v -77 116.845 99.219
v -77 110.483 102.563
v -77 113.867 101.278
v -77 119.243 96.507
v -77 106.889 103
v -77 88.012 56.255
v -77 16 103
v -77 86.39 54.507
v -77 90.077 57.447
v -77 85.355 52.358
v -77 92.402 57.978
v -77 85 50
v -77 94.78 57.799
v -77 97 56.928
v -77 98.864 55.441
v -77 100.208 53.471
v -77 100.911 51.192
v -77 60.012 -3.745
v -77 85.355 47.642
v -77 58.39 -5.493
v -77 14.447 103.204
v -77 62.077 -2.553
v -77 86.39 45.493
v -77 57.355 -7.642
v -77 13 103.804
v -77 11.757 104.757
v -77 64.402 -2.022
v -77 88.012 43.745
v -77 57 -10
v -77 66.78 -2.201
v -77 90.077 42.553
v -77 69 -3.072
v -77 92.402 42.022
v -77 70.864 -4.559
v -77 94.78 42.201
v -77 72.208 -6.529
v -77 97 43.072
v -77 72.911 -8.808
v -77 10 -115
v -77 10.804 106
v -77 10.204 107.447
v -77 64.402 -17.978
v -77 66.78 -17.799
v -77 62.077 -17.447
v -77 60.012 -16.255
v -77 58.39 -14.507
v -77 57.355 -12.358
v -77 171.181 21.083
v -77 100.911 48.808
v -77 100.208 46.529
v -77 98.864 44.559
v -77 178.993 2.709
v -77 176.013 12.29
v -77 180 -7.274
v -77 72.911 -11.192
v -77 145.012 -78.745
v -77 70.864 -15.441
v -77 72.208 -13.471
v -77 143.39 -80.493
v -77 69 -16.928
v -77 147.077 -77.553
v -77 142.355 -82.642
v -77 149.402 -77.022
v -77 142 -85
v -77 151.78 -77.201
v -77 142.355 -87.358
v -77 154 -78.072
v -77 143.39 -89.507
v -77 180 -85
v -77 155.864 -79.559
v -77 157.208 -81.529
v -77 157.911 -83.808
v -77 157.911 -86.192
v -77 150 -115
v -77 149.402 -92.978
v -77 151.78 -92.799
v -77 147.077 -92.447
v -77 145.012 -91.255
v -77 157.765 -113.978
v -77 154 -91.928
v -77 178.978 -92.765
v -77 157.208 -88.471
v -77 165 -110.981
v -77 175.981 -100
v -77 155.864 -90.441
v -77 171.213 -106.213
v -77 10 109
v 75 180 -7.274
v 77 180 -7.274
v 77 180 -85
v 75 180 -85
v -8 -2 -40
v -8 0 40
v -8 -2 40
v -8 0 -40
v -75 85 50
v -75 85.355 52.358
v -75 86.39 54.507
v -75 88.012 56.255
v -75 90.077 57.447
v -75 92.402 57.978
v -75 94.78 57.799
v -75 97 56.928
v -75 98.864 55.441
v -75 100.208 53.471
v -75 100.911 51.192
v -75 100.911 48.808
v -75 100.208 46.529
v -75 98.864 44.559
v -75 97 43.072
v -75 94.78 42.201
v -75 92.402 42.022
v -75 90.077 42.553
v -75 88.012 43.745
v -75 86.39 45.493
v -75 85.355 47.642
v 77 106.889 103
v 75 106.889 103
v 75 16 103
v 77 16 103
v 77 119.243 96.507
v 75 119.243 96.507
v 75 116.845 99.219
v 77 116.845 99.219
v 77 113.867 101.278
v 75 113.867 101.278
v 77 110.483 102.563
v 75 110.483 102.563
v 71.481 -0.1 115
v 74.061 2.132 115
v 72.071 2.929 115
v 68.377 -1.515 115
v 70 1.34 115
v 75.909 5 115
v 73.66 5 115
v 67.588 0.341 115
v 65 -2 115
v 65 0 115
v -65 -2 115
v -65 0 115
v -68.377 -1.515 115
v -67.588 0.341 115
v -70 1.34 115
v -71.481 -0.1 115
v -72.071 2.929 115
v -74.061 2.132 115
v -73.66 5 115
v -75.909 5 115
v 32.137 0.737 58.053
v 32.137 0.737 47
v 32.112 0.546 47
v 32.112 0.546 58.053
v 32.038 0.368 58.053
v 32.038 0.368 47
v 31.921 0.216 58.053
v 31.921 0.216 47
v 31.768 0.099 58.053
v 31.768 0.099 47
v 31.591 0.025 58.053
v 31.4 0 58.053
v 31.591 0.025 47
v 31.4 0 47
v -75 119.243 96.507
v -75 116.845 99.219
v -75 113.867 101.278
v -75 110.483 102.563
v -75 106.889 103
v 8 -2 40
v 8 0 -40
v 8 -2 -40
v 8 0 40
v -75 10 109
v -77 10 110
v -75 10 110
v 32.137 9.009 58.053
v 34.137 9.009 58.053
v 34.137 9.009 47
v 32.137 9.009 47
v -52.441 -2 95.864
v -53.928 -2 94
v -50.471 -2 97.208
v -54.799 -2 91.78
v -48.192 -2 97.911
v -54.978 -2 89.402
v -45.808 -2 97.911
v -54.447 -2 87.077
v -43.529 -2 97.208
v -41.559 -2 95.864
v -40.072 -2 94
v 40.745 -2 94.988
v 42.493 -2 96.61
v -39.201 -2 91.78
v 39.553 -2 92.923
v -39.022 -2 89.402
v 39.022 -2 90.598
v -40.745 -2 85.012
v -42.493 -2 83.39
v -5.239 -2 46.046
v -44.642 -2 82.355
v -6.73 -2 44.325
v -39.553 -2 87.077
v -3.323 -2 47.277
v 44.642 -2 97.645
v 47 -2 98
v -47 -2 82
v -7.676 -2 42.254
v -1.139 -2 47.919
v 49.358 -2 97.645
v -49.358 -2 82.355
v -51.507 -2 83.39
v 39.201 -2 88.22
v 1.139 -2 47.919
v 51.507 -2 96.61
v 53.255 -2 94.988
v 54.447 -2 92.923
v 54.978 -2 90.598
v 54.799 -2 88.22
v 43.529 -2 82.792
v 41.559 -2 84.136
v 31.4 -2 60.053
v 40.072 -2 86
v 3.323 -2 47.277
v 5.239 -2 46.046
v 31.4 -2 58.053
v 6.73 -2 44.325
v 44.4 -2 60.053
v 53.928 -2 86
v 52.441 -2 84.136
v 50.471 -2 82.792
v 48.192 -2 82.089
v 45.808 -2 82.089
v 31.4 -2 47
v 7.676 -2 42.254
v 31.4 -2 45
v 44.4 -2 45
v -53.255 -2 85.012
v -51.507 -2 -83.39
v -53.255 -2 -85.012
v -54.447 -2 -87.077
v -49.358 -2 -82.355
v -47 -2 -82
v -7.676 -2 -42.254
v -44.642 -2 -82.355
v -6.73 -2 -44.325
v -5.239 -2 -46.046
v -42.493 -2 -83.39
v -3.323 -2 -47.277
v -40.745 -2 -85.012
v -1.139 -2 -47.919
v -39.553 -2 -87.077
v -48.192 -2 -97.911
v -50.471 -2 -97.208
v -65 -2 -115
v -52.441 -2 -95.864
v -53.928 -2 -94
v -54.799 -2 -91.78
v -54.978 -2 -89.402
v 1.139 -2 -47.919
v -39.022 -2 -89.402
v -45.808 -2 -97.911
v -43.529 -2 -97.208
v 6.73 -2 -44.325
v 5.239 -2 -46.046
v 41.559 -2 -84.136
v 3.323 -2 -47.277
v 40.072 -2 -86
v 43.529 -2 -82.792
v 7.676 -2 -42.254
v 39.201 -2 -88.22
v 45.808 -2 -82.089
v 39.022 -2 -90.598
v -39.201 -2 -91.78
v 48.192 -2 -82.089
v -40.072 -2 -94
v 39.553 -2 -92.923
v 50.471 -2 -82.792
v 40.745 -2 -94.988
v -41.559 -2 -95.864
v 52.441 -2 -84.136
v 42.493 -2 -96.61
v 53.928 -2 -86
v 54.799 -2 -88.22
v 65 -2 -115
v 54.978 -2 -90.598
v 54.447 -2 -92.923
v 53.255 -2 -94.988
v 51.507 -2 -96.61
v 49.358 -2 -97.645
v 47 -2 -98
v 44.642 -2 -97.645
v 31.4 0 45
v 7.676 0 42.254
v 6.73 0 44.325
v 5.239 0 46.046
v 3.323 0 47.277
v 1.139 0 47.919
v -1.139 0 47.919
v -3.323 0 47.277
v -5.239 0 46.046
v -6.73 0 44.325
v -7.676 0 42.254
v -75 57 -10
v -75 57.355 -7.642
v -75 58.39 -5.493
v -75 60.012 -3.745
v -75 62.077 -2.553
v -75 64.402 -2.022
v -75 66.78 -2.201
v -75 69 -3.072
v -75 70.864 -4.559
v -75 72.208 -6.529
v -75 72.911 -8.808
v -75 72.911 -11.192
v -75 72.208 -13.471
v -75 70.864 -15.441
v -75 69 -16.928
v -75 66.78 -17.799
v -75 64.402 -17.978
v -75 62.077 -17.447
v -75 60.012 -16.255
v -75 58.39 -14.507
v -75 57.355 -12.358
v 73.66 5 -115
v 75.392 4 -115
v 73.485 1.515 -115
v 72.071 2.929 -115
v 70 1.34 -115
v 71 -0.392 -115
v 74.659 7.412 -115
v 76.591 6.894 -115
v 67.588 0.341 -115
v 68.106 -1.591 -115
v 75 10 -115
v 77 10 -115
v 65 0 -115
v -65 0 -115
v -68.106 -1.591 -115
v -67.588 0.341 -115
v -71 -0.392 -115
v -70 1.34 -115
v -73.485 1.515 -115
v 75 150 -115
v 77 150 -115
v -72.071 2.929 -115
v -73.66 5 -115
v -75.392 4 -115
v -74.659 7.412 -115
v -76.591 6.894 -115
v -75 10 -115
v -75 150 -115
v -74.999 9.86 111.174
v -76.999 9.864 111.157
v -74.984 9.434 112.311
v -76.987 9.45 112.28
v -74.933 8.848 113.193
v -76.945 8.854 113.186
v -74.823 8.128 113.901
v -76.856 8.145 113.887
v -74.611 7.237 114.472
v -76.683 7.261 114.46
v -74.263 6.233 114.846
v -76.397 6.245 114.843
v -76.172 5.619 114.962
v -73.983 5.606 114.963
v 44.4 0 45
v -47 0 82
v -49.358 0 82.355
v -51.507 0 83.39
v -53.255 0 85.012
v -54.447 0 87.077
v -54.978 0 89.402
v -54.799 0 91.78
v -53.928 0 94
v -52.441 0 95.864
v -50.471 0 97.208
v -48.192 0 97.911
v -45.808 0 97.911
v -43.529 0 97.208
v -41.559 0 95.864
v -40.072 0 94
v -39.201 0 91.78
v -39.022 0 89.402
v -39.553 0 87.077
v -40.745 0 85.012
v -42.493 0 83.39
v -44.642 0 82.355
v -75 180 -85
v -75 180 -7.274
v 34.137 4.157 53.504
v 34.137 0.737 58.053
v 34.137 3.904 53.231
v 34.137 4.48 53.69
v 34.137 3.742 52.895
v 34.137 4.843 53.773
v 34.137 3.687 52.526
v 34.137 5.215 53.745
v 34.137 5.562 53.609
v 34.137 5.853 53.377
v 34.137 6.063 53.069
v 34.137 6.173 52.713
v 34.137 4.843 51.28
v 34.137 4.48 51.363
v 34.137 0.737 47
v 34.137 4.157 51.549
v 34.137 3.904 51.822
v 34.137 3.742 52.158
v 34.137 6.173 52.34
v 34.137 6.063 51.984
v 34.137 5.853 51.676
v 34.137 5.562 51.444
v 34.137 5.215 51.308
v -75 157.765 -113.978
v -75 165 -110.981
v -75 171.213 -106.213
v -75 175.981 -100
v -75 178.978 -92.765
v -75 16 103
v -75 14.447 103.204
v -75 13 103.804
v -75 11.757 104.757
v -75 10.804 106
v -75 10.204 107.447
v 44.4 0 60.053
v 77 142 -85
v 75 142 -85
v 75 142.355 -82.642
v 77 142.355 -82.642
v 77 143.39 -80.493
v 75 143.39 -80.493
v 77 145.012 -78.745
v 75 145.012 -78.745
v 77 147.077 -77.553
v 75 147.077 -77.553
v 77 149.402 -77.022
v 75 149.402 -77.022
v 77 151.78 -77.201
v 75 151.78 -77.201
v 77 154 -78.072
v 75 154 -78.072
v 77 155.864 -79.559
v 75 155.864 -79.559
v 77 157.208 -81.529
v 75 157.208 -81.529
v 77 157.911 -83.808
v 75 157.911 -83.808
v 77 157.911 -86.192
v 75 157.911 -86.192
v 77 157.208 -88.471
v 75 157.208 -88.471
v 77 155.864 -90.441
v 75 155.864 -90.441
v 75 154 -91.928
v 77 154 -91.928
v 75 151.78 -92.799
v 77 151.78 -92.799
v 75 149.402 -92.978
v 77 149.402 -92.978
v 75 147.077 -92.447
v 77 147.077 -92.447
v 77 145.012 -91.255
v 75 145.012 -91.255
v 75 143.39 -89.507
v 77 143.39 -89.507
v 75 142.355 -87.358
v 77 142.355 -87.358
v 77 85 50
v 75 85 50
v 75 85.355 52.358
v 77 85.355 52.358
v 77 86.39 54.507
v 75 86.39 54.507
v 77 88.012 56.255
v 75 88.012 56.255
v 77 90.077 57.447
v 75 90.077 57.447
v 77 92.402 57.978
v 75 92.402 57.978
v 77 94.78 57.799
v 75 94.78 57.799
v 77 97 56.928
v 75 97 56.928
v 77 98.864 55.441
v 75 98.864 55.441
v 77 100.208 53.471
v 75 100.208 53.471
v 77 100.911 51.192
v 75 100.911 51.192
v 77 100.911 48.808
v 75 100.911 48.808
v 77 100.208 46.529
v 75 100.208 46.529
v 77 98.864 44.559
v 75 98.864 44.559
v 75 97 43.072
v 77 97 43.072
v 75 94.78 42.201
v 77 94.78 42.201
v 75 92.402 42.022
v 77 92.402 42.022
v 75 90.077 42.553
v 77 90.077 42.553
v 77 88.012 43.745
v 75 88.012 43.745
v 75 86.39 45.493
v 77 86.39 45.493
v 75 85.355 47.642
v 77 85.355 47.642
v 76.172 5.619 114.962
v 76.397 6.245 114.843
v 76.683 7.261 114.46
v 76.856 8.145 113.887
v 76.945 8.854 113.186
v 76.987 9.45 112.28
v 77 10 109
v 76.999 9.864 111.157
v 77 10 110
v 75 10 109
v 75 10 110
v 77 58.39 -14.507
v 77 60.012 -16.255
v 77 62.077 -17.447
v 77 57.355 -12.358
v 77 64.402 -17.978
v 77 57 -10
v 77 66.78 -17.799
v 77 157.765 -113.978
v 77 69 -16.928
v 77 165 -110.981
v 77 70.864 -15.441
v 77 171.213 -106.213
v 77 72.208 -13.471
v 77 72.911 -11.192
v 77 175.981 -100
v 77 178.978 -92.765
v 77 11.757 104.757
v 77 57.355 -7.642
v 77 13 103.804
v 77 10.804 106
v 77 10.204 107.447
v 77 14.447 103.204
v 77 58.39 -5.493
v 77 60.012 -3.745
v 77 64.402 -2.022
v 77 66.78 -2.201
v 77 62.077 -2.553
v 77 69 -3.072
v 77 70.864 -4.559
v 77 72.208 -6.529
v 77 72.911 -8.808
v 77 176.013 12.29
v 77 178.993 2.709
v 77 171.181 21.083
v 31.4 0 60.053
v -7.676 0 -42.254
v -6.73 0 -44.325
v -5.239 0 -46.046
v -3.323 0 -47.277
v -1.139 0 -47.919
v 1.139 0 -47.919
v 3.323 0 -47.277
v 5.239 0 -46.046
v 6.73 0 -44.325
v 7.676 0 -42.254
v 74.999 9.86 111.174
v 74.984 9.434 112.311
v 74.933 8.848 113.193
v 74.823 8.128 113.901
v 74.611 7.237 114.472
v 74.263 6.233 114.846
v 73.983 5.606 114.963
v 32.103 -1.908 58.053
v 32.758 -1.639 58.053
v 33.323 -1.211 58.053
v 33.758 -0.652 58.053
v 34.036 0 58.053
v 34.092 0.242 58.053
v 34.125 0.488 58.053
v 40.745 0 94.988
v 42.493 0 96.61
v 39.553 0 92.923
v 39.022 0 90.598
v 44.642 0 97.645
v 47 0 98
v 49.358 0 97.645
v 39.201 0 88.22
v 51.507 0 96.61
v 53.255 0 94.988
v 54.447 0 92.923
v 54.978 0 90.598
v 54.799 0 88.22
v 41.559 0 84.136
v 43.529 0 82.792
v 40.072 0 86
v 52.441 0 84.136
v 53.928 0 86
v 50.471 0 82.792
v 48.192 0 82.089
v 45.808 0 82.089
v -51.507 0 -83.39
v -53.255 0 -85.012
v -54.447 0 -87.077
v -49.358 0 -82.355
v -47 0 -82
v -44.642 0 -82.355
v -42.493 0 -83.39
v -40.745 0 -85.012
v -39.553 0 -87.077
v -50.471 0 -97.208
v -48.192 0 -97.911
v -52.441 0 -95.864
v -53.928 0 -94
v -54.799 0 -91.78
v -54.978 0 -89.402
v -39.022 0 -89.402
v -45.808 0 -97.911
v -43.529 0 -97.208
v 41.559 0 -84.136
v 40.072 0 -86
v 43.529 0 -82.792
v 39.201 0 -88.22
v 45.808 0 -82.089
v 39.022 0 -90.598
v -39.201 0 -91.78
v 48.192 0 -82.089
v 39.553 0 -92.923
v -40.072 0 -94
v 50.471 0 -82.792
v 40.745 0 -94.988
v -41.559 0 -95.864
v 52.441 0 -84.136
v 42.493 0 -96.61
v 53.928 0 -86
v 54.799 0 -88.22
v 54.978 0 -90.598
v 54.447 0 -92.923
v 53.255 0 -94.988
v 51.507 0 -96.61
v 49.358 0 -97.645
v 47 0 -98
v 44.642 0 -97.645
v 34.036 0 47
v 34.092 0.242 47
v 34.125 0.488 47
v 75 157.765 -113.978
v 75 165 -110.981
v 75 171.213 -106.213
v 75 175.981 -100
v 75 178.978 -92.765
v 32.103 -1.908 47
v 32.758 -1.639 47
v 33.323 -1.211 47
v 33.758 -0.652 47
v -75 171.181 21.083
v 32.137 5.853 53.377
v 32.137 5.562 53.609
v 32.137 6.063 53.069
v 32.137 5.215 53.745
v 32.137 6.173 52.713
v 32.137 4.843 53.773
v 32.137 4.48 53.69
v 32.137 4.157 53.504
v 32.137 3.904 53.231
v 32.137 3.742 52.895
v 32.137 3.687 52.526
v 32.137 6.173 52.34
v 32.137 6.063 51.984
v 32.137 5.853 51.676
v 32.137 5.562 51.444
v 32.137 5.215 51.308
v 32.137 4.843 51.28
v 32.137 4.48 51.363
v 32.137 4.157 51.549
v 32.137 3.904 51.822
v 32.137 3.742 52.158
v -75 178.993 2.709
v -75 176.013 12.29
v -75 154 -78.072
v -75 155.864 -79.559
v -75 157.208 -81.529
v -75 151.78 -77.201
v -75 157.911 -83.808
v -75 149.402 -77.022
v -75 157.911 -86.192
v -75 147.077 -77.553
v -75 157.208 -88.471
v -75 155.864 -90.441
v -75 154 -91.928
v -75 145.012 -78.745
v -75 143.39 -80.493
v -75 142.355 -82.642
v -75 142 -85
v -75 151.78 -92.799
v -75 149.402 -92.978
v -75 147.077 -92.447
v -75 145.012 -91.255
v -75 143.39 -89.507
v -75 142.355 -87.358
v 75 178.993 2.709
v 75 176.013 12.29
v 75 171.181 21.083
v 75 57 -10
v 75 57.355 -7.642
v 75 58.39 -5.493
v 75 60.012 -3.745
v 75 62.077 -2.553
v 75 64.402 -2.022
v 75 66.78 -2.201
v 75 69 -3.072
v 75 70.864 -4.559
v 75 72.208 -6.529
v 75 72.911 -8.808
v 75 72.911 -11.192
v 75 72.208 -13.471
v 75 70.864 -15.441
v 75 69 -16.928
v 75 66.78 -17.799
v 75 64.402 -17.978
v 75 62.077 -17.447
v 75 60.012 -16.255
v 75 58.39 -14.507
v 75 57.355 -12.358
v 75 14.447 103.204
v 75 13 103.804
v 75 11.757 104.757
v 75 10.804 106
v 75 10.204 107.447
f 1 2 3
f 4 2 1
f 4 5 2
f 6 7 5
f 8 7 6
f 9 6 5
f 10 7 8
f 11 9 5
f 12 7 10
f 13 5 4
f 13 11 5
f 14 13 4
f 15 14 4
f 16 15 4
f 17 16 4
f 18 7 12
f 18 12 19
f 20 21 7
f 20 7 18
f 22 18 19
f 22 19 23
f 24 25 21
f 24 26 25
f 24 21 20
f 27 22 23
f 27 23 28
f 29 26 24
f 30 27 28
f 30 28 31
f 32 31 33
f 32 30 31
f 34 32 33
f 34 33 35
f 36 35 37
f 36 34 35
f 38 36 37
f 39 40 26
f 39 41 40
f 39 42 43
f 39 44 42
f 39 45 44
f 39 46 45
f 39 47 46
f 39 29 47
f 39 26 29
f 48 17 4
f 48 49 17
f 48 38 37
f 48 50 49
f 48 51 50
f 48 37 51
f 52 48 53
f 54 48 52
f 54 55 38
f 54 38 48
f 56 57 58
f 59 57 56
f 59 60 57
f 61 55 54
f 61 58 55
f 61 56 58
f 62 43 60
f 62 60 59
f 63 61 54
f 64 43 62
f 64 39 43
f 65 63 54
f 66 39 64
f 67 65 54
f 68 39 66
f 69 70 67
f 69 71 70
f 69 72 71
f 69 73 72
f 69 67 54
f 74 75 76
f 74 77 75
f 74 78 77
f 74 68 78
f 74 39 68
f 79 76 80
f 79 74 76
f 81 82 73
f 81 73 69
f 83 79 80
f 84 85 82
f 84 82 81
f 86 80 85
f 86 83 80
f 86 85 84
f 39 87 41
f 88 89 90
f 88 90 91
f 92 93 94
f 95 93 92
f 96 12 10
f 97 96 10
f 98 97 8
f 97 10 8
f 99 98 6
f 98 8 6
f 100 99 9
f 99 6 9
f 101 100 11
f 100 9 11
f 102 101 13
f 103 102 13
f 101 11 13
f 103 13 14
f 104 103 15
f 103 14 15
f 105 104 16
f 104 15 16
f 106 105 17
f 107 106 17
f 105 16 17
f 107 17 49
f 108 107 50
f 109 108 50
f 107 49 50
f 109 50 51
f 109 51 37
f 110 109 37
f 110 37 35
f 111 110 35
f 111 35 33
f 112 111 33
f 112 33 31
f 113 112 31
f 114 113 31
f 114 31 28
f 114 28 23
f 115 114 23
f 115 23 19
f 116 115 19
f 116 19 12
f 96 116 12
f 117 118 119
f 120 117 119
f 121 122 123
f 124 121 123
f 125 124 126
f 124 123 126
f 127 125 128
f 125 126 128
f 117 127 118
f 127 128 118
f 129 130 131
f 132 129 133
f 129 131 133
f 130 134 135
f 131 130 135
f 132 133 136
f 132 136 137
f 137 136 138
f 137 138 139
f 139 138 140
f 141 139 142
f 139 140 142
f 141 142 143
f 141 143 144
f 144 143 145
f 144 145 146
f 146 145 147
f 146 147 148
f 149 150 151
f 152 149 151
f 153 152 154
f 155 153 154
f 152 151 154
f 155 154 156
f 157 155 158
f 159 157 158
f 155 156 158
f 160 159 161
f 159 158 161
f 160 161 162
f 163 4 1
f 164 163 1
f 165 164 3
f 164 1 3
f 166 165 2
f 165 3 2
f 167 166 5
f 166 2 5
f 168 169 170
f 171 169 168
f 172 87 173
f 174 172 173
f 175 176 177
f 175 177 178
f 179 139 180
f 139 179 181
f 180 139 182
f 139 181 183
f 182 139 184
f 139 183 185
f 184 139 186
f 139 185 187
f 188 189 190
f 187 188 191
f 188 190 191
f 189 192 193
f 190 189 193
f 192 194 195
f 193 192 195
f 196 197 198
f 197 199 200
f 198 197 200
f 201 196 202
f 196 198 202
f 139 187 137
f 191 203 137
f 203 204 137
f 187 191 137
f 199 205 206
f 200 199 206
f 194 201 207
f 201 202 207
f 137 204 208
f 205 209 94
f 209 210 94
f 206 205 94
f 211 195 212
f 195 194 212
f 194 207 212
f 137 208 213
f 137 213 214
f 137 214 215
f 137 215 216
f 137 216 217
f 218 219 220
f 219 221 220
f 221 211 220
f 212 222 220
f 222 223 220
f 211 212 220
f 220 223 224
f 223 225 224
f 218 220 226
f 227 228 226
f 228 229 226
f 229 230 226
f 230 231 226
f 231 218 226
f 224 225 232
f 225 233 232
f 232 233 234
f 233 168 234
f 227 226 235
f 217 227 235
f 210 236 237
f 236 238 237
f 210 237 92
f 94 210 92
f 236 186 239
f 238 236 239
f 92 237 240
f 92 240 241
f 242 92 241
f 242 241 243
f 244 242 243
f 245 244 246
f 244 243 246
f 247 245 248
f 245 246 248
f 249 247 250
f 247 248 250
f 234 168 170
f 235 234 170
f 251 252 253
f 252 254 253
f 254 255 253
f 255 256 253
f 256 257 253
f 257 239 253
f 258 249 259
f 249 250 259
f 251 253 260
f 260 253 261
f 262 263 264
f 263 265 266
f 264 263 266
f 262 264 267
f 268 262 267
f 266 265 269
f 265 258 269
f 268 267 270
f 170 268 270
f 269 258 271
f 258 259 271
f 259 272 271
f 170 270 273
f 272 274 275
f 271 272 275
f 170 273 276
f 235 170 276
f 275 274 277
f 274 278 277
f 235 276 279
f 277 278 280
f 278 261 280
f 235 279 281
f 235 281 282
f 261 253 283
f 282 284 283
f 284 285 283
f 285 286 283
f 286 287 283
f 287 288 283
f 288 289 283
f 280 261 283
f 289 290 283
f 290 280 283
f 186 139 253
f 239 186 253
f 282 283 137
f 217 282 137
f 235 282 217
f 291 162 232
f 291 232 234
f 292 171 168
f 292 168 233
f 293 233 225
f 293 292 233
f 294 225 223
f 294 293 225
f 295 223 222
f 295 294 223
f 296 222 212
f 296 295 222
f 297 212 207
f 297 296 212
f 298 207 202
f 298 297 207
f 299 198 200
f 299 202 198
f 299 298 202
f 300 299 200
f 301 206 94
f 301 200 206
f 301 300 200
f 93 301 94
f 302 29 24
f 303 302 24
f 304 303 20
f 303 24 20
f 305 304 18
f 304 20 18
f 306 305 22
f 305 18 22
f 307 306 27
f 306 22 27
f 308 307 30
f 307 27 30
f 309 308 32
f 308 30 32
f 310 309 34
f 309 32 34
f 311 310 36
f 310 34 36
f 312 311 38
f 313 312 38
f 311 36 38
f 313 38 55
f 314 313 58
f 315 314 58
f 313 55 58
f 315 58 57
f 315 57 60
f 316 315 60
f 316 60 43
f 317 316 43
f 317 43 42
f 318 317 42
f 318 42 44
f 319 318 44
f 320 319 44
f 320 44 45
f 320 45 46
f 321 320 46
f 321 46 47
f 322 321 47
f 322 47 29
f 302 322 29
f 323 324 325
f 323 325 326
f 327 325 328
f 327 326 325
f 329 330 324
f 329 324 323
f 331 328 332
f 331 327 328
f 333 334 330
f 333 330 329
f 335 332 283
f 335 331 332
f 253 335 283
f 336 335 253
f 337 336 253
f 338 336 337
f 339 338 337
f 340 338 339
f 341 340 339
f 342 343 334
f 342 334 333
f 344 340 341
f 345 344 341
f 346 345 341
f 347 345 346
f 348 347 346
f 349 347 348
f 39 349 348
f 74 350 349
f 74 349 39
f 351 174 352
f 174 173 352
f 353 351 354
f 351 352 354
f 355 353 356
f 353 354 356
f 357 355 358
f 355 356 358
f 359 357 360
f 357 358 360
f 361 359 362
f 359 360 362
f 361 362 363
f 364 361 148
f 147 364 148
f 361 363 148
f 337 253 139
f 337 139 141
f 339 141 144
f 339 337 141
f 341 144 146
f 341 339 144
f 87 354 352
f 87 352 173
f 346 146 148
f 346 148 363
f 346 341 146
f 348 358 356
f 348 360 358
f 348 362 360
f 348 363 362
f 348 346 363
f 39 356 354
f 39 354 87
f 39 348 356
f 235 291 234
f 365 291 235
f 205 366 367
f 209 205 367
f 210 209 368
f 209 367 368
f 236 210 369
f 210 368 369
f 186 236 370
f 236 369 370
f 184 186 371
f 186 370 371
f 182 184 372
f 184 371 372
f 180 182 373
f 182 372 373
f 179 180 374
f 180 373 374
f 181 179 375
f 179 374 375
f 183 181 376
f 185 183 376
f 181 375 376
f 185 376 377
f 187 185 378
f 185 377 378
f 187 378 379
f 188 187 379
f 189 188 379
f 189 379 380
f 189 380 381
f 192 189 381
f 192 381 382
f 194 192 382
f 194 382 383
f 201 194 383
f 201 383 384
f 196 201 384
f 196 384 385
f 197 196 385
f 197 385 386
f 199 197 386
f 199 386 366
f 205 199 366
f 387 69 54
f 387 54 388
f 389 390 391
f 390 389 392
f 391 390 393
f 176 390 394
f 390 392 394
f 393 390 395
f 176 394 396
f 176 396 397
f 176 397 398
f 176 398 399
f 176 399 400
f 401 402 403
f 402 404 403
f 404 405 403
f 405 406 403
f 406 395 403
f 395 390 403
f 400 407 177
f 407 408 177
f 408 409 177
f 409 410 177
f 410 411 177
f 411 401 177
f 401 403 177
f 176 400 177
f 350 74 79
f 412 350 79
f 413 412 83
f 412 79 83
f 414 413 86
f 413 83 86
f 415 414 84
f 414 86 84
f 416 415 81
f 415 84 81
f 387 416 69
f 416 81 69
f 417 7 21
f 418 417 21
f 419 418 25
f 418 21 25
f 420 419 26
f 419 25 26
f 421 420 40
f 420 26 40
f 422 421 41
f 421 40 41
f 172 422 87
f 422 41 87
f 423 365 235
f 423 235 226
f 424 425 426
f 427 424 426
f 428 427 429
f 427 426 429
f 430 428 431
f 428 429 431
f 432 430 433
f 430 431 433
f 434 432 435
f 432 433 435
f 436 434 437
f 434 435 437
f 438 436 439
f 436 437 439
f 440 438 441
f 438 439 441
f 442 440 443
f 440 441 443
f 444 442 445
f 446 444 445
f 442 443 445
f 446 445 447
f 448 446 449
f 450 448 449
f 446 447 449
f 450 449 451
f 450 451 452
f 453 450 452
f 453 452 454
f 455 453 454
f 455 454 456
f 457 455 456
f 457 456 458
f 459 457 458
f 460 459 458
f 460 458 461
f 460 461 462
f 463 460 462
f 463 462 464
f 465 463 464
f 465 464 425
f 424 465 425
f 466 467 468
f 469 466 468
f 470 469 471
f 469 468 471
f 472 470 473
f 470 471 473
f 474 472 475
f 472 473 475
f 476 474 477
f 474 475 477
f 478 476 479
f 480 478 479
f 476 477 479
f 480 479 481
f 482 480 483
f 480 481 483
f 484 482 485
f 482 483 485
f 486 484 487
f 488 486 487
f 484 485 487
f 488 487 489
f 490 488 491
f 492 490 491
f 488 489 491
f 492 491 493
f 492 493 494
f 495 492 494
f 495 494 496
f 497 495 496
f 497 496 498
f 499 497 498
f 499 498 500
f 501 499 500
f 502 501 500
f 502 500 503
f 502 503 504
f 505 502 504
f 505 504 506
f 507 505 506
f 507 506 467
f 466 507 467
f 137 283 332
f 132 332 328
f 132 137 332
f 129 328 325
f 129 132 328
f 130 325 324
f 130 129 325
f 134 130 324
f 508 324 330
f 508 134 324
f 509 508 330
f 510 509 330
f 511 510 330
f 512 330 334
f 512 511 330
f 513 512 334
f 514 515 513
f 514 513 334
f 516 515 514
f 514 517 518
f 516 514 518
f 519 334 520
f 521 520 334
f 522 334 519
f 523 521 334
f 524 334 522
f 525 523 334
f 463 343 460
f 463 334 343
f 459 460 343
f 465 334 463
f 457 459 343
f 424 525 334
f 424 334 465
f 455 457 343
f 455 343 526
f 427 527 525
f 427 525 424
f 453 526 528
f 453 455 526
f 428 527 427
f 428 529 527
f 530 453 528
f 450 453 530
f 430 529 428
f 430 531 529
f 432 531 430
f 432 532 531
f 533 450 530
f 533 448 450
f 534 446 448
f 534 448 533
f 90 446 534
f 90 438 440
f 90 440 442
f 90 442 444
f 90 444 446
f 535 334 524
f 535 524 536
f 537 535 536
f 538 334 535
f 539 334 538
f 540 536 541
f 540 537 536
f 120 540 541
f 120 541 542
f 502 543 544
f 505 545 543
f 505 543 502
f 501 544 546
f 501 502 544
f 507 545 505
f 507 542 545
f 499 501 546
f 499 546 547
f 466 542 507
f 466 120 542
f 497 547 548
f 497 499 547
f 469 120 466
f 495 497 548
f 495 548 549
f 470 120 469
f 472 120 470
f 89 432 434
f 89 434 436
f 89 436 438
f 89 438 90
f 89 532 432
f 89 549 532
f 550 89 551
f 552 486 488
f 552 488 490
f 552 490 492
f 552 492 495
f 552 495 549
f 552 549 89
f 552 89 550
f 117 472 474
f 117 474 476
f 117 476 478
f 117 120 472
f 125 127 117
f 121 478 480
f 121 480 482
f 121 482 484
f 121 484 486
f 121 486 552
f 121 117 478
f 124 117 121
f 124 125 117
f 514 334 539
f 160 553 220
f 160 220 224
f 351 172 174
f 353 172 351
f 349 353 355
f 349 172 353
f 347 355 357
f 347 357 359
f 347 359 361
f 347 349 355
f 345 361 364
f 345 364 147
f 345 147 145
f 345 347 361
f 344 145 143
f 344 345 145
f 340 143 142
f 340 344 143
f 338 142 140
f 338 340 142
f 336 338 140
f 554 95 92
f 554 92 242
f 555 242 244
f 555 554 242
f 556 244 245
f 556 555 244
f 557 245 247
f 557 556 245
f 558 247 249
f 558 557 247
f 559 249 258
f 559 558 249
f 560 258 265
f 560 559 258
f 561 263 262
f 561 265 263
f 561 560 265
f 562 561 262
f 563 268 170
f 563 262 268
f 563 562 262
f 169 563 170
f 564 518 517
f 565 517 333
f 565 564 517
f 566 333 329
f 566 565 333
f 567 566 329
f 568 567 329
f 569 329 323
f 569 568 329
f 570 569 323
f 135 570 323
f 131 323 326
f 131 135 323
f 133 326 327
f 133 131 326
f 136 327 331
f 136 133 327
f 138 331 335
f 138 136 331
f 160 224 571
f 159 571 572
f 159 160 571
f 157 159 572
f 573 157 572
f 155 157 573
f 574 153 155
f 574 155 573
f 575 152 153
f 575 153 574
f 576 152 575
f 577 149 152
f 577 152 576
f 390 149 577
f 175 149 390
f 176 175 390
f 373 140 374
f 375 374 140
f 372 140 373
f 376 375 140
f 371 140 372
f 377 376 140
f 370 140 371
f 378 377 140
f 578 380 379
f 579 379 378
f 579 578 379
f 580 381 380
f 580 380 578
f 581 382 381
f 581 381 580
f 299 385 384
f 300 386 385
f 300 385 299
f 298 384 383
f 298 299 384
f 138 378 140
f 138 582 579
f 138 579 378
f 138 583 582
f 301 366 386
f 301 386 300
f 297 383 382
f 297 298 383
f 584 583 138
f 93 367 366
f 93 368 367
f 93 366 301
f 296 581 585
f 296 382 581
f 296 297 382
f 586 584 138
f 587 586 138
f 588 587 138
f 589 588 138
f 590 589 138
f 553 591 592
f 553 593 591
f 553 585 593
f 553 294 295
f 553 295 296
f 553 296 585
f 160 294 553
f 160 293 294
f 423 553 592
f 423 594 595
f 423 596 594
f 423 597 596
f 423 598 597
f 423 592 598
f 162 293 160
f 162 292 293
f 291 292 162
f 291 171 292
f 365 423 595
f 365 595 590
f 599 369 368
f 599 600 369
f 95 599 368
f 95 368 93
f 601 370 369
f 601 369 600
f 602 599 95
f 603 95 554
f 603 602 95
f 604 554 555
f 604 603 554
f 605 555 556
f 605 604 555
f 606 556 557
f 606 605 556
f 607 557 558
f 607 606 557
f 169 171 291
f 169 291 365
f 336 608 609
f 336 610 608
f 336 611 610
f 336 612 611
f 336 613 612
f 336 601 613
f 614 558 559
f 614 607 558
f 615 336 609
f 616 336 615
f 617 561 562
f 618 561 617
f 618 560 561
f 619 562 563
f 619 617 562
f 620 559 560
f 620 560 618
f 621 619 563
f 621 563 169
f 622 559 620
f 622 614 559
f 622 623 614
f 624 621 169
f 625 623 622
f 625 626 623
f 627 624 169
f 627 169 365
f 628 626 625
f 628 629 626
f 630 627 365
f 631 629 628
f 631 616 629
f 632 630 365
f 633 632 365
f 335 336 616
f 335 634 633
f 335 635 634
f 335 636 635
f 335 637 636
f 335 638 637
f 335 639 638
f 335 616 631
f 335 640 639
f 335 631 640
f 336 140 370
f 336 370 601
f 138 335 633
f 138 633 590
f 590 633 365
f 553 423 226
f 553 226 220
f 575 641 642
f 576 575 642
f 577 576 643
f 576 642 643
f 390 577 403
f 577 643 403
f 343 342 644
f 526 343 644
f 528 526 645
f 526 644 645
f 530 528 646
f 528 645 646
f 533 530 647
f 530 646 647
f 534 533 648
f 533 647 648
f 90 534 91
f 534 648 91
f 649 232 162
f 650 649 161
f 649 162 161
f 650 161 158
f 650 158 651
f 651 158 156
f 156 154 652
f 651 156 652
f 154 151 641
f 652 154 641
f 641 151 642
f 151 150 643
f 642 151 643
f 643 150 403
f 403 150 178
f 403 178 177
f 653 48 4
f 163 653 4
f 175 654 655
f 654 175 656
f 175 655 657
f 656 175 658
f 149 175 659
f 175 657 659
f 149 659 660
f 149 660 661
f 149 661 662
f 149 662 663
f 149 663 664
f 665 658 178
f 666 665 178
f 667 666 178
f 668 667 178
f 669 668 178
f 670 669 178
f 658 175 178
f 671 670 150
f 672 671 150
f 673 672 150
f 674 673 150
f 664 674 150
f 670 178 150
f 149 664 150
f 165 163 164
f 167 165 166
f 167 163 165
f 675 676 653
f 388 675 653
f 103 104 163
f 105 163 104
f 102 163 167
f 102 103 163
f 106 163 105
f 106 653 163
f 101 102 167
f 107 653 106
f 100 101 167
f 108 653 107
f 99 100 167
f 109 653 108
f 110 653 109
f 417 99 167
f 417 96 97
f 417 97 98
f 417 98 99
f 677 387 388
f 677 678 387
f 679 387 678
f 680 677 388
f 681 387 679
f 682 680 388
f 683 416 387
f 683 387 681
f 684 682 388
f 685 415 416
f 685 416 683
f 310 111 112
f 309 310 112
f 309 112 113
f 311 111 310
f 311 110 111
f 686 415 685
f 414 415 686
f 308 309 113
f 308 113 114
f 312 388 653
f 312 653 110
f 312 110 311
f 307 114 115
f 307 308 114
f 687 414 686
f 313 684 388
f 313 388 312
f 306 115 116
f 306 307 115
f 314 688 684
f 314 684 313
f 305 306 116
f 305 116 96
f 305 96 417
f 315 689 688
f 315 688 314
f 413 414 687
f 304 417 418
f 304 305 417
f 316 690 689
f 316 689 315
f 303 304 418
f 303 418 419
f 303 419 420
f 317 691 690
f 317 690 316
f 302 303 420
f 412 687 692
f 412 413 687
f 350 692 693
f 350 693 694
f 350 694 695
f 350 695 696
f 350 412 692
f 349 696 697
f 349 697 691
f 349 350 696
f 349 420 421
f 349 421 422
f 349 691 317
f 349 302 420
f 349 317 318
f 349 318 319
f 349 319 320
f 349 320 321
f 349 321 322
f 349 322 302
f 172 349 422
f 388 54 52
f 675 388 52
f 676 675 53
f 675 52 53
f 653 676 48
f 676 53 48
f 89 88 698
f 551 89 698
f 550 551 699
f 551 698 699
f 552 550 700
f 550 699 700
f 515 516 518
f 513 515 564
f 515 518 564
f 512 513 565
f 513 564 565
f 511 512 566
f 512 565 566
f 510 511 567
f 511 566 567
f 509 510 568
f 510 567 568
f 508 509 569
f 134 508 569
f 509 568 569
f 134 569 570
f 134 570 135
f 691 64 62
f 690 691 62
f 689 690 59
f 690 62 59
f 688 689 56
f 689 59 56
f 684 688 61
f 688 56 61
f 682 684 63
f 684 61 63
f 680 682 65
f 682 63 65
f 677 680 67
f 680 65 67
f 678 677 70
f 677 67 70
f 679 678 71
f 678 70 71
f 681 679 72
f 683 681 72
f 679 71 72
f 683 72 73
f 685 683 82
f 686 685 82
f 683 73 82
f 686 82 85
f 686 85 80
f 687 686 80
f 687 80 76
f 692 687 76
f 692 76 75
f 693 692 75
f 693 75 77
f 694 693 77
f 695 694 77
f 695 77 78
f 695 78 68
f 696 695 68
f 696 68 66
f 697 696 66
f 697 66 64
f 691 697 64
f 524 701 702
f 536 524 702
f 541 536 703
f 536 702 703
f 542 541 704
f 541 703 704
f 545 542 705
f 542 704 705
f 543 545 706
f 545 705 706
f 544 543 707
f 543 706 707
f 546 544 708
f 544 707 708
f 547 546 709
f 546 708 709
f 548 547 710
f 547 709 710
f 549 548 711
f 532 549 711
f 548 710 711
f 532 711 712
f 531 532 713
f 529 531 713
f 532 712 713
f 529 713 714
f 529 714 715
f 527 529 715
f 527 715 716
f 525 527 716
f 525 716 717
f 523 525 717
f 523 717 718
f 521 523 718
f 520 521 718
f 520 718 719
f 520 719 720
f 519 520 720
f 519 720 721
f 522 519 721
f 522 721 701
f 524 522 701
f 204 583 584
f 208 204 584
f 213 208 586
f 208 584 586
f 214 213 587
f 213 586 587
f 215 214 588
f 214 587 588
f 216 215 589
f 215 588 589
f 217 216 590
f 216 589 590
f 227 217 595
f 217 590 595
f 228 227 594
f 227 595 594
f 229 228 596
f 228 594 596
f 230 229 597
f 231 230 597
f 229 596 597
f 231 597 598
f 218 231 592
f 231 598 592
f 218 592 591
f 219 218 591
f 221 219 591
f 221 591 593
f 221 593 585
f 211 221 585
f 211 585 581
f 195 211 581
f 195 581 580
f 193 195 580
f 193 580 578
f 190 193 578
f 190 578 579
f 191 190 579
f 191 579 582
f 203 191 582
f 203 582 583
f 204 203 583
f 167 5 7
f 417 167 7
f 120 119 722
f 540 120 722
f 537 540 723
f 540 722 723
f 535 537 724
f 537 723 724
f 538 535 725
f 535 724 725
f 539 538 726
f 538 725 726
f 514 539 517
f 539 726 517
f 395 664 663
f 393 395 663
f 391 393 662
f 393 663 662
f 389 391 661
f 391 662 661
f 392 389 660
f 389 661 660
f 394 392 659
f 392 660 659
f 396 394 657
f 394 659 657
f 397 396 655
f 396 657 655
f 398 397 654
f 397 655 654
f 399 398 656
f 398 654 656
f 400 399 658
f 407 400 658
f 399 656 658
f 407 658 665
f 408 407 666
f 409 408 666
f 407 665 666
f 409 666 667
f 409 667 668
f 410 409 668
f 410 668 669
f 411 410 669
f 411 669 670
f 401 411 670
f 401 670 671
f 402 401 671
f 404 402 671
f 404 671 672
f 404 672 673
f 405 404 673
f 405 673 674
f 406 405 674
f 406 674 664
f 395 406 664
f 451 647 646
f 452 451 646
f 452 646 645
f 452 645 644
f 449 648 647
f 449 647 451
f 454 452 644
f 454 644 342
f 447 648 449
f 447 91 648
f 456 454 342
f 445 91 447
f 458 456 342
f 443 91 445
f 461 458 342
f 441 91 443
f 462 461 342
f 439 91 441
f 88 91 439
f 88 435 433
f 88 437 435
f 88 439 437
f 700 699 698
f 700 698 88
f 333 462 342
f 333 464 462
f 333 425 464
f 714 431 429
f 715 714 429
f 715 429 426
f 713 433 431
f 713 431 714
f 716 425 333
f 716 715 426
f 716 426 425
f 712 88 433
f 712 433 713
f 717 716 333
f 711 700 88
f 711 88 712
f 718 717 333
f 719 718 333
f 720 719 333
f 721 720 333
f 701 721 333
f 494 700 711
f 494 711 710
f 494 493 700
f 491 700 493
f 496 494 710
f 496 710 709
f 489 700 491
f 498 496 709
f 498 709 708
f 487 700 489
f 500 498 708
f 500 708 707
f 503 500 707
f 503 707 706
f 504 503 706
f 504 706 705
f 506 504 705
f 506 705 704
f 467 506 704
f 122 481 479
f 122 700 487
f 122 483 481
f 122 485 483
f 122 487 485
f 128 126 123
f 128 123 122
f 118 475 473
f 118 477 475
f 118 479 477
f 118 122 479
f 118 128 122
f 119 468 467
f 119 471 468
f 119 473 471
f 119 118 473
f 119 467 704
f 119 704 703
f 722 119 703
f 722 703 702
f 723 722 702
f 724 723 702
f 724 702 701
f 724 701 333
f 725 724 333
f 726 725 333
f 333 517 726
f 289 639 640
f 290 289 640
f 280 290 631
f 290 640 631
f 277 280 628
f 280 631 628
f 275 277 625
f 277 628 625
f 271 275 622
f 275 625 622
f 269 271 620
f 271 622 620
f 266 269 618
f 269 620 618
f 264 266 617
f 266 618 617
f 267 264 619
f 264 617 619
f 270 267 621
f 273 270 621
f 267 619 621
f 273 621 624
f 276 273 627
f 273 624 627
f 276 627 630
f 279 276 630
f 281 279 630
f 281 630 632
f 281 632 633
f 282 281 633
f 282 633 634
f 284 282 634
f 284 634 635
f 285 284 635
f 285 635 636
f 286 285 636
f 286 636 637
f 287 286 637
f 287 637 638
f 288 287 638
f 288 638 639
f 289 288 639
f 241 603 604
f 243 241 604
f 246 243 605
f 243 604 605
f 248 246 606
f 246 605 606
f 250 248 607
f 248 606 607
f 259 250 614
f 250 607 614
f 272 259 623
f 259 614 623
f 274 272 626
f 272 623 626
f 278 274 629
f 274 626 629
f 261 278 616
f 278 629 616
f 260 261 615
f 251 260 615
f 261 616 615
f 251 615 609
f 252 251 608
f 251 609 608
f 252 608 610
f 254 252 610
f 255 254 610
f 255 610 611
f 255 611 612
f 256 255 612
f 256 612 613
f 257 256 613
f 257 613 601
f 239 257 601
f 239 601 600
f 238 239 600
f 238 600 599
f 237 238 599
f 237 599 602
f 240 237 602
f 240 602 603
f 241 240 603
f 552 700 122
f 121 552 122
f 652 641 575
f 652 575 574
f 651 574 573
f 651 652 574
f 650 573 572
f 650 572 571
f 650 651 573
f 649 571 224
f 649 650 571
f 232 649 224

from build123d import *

# Parameters (mm, degrees)
SKETCH1_W                      = 150
SKETCH1_H                      = 230
BASE_FLANGE1_DEPTH             = 2
EDGE_FLANGE1_STRIP_W           = 28
EDGE_FLANGE1_STRIP_H           = 2
EDGE_FLANGE1_STRIP_CUT_DEPTH   = 230
EDGE_FLANGE1_STRIP_2_W         = 28
EDGE_FLANGE1_STRIP_2_H         = 2
EDGE_FLANGE1_STRIP_CUT_2_DEPTH = 230
EDGE_FLANGE1_DEPTH             = 230
EDGE_FLANGE1_BEND_DEPTH        = 230
SKETCH15_OUTSIDE_W             = 298.254
SKETCH15_OUTSIDE_H             = 250.254
SKETCH15_OUTSIDE_R             = 8
CUT_EXTRUDE1_DEPTH             = 264.326793168
SKETCH16_R                     = 8
CUT_EXTRUDE2_DEPTH             = 228.055059487
CUT_EXTRUDE3_DEPTH             = 228.055059487
SKETCHED_START                 = 47
SKETCHED_BEND1_DEPTH           = 11.052994728
SKETCHED_BEND1_2_DEPTH         = 11.052994728
CUT_EXTRUDE4_REACH             = 241.866
SKETCH20_R                     = 1.25


# Read off the part's stored shape, not the designer's step: Sketched Bend1
# Sheet-metal steps are written as plain solids
with BuildPart() as part:
    # Sketch1 → Base-Flange1 (new body)
    with BuildSketch(Plane(origin=(0, 0, 0), x_dir=(1, 0, 0), z_dir=(0, 1, 0))):
        Rectangle(SKETCH1_W, SKETCH1_H)
    extrude(amount=-BASE_FLANGE1_DEPTH)

    # Edge-Flange1 strip (across the edge) → Edge-Flange1 strip cut (cut)
    with BuildSketch(Plane(origin=(75, 0, 115), x_dir=(-1, 0, 0), z_dir=(0, 0, -1))):
        with Locations((-4, -1)):
            Rectangle(EDGE_FLANGE1_STRIP_W, EDGE_FLANGE1_STRIP_H)
    extrude(amount=EDGE_FLANGE1_STRIP_CUT_DEPTH, mode=Mode.SUBTRACT)

    # Edge-Flange1 strip 2 (across the edge) → Edge-Flange1 strip cut 2 (cut)
    with BuildSketch(Plane(origin=(-75, 0, -115), x_dir=(1, 0, 0), z_dir=(0, 0, 1))):
        with Locations((-4, -1)):
            Rectangle(EDGE_FLANGE1_STRIP_2_W, EDGE_FLANGE1_STRIP_2_H)
    extrude(amount=EDGE_FLANGE1_STRIP_CUT_2_DEPTH, mode=Mode.SUBTRACT)

    # Edge-Flange1 section (across the edge) → Edge-Flange1 (add)
    with BuildSketch(Plane(origin=(75, 0, 115), x_dir=(-1, 0, 0), z_dir=(0, 0, -1))):
        with BuildLine():
            Line((-2, 10), (-2, 180))
            Line((-2, 180), (0, 180))
            Line((0, 180), (0, 10))
            ThreePointArc((0, 10), (2.928932188, 2.928932188), (10, 0))
            Line((10, 0), (10, -2))
            ThreePointArc((10, -2), (1.514718626, 1.514718626), (-2, 10))
        make_face()
    extrude(amount=EDGE_FLANGE1_DEPTH)

    # Edge-Flange1 section 2 (across the edge) → Edge-Flange1 bend (add)
    with BuildSketch(Plane(origin=(-75, 0, -115), x_dir=(1, 0, 0), z_dir=(0, 0, 1))):
        with BuildLine():
            Line((-2, 10), (-2, 180))
            Line((-2, 180), (0, 180))
            Line((0, 180), (0, 10))
            ThreePointArc((0, 10), (2.928932188, 2.928932188), (10, 0))
            Line((10, 0), (10, -2))
            ThreePointArc((10, -2), (1.514718626, 1.514718626), (-2, 10))
        make_face()
    extrude(amount=EDGE_FLANGE1_BEND_DEPTH)

    # Sketch15 outside → Cut-Extrude1 (cut, through all)
    # profile 1 of 4: a face of its own
    with BuildSketch(Plane.ZY.offset(77)):
        with Locations((0, 89)):
            Rectangle(SKETCH15_OUTSIDE_W, SKETCH15_OUTSIDE_H)
        with BuildLine():
            Line((21.083470393, 171.180744276), (96.507242037, 119.243178795))
            ThreePointArc((96.507242037, 119.243178795), (101.277963521, 113.867184852), (103, 106.888955512))
            Line((103, 106.888955512), (103, 16))
            ThreePointArc((103, 16), (104.757359313, 11.757359313), (109, 10))
            Line((109, 10), (110, 10))
            ThreePointArc((110, 10), (113.535533906, 8.535533906), (115, 5))
            Line((115, 5), (115, -2))
            Line((115, -2), (-115, -2))
            Line((-115, -2), (-115, 99))
            Line((-115, 99), (-115, 150))
            ThreePointArc((-115, 150), (-106.213203436, 171.213203436), (-85, 180))
            Line((-85, 180), (-49, 180))
            Line((-49, 180), (-7.274003064, 180))
            ThreePointArc((-7.274003064, 180), (7.574612801, 177.744304445), (21.083470393, 171.180744276))
        make_face(mode=Mode.SUBTRACT)
    # profile 2 of 4: a face of its own
    with BuildSketch(Plane.ZY.offset(77)):
        with Locations(Location((50, 93, 0), (0, 0, 270))):
            Circle(SKETCH15_OUTSIDE_R)
    # profile 3 of 4: a face of its own
    with BuildSketch(Plane.ZY.offset(77)):
        with Locations(Location((-85, 150, 0), (0, 0, 270))):
            Circle(SKETCH15_OUTSIDE_R)
    # profile 4 of 4: a face of its own
    with BuildSketch(Plane.ZY.offset(77)):
        with Locations(Location((-10, 65, 0), (0, 0, 270))):
            Circle(SKETCH15_OUTSIDE_R)
    extrude(amount=-CUT_EXTRUDE1_DEPTH, mode=Mode.SUBTRACT)

    # Sketch16 → Cut-Extrude2 (cut, through all)
    with BuildSketch(Plane(origin=(0, 0, 0), x_dir=(1, 0, 0), z_dir=(0, 1, 0))):
        with Locations(Location((-47, 90, 0), (0, 0, 270))):
            Circle(SKETCH16_R)
        with Locations(Location((47, 90, 0), (0, 0, 90))):
            Circle(SKETCH16_R)
        with Locations(Location((47, -90, 0), (0, 0, 270))):
            Circle(SKETCH16_R)
        with Locations(Location((-47, -90, 0), (0, 0, 90))):
            Circle(SKETCH16_R)
        with BuildLine():
            Line((8, 40), (8, -40))
            ThreePointArc((8, -40), (0, -48), (-8, -40))
            Line((-8, -40), (-8, 40))
            ThreePointArc((-8, 40), (0, 48), (8, 40))
        make_face()
    extrude(amount=-CUT_EXTRUDE2_DEPTH, mode=Mode.SUBTRACT)

    # Sketch18 → Cut-Extrude3 (cut, through all)
    with BuildSketch(Plane(origin=(0, 0, 0), x_dir=(1, 0, 0), z_dir=(0, 1, 0))):
        Polygon((31.4, -45), (44.4, -45), (44.4, -60.052994728), (31.4, -60.052994728), (31.4, -58.052994728), (42.4, -58.052994728), (42.4, -47), (31.4, -47), align=None)
    extrude(amount=-CUT_EXTRUDE3_DEPTH, mode=Mode.SUBTRACT)

    # Sketched Bend1 outline → Sketched Bend1 (cut)
    with BuildSketch(Plane.XY.offset(SKETCHED_START)):
        with BuildLine():
            ThreePointArc((34.035602398, 0), (33.054267209, -1.443395312), (31.4, -2))
            Line((31.4, -2), (42.4, -2))
            Line((42.4, -2), (42.4, 0))
            Line((42.4, 0), (34.035602398, 0))
        make_face()
    extrude(amount=SKETCHED_BEND1_DEPTH, mode=Mode.SUBTRACT)

    # Sketched Bend1 2 outline → Sketched Bend1 2 (add)
    with BuildSketch(Plane.XY.offset(SKETCHED_START)):
        with BuildLine():
            Line((31.4, 0), (34.035602398, 0))
            ThreePointArc((34.035602398, 0), (34.111233029, 0.364854094), (34.1366, 0.7366))
            Line((34.1366, 0.7366), (34.1366, 9.008755099))
            Line((34.1366, 9.008755099), (32.1366, 9.008755099))
            Line((32.1366, 9.008755099), (32.1366, 0.7366))
            ThreePointArc((32.1366, 0.7366), (31.920854855, 0.215745145), (31.4, 0))
        make_face()
    extrude(amount=SKETCHED_BEND1_2_DEPTH)

    # Sketch20 → Cut-Extrude4 (cut, up to next)
    with BuildSketch(Plane.ZY.offset(-32.1366), mode=Mode.PRIVATE) as cut_extrude4_sk1:
        with Locations(Location((52.526497364, 4.9366, 0), (0, 0, 270))):
            Circle(SKETCH20_R)
    cut_extrude4_tool1 = extrude(cut_extrude4_sk1.sketch, amount=-CUT_EXTRUDE4_REACH, mode=Mode.PRIVATE) & part.part
    add(cut_extrude4_tool1.solids().sort_by_distance((32.1366, 4.9366, 52.526497))[0], mode=Mode.SUBTRACT)


solid = part.part
